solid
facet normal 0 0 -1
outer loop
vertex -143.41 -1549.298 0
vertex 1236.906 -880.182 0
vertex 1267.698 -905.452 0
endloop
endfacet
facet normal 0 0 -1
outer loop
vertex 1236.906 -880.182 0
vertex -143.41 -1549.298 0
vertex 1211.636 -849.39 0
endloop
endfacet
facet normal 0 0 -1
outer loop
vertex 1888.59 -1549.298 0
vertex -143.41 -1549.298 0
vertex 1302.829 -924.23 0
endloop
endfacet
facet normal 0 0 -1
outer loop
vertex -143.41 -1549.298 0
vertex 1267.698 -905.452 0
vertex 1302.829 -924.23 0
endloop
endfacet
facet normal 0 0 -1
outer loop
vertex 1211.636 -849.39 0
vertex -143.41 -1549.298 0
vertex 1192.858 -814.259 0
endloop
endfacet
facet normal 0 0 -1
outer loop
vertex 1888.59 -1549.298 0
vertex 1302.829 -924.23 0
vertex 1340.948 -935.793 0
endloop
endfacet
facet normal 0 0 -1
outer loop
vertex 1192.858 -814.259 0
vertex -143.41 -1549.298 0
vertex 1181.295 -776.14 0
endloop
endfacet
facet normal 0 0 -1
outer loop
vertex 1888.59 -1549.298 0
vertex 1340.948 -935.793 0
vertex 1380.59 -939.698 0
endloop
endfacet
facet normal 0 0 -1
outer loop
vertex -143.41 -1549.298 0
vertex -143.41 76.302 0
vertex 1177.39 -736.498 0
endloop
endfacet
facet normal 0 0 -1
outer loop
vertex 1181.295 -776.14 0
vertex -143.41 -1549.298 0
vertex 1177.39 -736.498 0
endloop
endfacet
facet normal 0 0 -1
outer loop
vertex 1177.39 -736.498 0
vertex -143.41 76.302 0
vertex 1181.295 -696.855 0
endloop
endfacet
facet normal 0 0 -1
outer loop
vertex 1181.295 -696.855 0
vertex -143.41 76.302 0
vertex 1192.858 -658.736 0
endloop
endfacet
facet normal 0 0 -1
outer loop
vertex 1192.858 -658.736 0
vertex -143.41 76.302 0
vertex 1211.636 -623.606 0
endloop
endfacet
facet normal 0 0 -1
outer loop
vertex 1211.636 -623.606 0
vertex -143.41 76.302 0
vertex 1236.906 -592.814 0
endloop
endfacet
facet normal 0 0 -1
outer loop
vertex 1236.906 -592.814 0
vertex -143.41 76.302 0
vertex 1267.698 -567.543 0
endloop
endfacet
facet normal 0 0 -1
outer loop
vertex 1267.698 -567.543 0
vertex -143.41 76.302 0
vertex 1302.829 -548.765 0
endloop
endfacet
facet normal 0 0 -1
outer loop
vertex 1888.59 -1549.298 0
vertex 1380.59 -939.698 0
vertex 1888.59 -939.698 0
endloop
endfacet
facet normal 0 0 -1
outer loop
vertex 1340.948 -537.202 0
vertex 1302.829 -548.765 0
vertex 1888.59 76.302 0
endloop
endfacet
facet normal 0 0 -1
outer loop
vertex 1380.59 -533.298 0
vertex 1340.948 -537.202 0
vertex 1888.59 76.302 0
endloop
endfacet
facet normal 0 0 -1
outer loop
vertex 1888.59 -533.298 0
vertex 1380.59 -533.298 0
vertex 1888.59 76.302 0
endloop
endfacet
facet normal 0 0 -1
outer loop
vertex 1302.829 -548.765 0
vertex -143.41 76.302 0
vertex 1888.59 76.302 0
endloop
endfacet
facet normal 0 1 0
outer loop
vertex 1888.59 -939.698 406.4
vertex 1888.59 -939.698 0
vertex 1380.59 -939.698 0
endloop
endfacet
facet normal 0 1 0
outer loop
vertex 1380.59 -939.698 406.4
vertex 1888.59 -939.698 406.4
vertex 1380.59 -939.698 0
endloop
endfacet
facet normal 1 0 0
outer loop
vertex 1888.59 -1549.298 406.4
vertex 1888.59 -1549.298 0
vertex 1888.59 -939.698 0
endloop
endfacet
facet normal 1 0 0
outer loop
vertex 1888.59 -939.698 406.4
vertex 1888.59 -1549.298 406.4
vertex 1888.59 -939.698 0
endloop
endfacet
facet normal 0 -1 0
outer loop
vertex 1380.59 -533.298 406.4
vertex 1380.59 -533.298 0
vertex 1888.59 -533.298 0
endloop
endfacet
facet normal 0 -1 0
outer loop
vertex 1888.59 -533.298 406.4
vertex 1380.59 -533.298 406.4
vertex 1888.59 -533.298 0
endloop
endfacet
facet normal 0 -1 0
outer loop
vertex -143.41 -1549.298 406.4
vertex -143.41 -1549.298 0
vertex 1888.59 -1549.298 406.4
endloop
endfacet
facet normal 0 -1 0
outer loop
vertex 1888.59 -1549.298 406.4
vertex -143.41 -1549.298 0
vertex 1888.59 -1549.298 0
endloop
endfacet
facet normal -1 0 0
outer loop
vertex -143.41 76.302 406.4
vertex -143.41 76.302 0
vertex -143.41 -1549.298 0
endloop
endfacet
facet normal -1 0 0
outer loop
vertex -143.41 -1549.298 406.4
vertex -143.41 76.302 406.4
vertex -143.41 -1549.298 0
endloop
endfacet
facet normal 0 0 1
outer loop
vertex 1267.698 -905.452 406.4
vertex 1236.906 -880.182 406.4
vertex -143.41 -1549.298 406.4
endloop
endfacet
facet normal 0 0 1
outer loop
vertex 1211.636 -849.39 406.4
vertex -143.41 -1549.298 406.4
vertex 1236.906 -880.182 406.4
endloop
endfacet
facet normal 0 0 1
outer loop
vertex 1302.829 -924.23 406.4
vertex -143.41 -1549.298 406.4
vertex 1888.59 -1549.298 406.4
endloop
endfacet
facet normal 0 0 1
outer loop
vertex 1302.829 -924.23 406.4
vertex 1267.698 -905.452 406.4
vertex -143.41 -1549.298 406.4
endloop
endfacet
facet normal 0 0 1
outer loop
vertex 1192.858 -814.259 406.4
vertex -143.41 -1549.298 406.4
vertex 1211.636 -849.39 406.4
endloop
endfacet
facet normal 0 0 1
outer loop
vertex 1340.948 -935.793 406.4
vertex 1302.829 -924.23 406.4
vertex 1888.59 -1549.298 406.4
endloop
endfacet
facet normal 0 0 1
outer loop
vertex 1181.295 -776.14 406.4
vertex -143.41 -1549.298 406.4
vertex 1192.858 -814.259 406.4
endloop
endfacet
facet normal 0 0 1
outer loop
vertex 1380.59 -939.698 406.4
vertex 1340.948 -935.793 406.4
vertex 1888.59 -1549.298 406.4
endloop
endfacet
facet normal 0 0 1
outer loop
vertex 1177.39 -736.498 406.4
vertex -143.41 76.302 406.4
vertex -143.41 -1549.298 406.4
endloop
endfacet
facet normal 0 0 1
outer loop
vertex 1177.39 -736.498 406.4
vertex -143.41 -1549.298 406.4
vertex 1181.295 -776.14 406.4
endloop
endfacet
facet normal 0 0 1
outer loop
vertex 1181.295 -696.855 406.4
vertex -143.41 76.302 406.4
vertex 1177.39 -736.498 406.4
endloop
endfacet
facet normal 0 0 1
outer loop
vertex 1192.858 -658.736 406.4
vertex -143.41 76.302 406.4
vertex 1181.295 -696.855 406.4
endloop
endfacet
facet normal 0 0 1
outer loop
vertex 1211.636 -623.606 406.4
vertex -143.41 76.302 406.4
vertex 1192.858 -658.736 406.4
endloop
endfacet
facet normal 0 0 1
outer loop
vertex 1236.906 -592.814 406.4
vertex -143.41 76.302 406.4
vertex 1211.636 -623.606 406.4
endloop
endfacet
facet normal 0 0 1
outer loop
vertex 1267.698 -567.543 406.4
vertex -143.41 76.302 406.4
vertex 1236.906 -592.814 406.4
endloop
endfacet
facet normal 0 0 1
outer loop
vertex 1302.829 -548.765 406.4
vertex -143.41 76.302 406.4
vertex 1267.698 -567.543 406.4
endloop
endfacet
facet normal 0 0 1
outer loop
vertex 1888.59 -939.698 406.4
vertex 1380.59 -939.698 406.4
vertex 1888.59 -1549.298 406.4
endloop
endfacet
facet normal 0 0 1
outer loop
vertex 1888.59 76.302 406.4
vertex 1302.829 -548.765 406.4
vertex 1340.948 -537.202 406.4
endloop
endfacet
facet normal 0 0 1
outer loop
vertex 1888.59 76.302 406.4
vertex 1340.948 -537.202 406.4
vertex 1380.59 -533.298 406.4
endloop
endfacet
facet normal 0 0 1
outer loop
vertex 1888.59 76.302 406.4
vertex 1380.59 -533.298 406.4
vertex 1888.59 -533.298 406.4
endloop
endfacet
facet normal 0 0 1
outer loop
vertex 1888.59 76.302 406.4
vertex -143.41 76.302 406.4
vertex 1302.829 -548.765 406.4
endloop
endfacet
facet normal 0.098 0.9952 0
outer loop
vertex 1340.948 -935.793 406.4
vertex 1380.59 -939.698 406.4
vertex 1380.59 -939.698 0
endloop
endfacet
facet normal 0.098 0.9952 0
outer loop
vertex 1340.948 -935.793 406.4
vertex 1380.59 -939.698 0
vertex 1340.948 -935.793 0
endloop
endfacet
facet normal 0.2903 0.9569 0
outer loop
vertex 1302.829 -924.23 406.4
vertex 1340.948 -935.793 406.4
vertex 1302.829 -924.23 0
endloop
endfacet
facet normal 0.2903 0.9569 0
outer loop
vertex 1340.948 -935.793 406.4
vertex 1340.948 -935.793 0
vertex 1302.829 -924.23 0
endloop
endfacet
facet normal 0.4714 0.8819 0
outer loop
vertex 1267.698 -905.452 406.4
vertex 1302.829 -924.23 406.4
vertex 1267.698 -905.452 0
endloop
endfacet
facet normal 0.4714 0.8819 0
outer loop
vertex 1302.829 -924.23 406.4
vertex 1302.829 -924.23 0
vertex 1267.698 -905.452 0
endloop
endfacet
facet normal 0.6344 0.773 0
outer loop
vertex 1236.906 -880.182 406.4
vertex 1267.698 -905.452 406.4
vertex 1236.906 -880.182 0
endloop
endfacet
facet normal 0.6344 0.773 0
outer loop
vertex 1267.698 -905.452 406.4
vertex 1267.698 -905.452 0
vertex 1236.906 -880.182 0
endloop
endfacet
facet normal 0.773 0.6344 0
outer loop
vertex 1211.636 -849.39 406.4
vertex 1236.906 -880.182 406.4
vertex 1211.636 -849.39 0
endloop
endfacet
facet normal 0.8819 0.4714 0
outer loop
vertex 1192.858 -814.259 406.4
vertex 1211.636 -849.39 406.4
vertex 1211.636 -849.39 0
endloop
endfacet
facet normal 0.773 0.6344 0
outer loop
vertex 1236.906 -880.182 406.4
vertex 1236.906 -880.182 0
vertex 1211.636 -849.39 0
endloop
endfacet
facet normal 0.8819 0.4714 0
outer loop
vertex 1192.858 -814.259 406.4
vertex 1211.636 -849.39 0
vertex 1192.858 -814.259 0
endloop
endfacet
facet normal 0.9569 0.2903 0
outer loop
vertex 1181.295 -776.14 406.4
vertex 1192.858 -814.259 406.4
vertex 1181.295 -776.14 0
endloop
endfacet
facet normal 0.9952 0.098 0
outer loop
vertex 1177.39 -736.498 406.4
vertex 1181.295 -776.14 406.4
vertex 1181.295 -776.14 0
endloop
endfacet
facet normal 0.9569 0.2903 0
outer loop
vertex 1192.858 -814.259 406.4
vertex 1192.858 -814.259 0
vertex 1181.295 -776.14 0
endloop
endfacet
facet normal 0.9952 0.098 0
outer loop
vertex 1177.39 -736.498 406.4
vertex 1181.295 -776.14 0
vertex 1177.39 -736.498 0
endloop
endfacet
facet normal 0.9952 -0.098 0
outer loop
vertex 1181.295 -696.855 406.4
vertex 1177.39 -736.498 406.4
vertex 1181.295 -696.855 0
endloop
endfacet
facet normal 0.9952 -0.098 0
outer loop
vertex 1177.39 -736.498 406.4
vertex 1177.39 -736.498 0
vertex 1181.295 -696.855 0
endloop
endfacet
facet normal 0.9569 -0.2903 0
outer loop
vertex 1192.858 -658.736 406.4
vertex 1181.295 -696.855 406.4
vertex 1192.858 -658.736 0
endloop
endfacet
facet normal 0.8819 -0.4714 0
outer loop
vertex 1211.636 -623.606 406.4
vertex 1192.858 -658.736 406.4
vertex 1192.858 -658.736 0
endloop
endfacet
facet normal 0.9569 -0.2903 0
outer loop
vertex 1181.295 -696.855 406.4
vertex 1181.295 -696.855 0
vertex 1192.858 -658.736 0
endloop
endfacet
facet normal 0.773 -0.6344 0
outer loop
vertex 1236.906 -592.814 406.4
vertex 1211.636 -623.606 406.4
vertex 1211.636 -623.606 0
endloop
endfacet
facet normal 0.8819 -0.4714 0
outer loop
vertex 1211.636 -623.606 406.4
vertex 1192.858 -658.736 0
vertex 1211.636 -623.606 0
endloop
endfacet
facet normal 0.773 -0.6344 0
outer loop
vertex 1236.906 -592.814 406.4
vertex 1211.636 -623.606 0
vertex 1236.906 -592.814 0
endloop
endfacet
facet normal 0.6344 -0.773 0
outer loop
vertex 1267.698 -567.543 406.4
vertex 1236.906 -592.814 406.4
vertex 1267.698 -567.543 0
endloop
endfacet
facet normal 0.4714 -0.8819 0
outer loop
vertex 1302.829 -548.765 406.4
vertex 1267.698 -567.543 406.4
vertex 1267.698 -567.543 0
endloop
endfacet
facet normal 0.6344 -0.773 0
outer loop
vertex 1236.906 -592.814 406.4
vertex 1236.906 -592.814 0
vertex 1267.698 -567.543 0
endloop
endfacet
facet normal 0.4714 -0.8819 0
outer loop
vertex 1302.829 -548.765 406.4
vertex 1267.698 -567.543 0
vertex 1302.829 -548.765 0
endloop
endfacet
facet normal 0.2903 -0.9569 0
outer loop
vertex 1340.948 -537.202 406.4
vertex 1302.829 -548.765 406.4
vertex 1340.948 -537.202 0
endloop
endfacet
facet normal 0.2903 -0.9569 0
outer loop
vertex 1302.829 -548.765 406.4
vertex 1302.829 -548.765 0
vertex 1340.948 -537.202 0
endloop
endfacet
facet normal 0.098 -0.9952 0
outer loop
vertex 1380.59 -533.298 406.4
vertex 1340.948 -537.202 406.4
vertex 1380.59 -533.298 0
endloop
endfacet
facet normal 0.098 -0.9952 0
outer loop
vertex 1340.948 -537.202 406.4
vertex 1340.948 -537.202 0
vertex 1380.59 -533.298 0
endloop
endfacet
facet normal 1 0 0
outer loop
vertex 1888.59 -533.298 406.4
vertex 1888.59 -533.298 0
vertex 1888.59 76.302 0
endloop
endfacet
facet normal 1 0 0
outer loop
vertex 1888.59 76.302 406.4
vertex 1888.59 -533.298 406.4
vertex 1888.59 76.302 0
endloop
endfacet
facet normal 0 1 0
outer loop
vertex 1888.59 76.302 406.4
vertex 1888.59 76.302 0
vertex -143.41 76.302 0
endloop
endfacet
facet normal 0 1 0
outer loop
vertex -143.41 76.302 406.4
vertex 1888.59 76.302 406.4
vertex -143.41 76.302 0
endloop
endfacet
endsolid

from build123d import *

# Parameters (mm, degrees)
F1_DEPTH = 406.4


with BuildPart() as f1:
    # F0 (on Top) → F1 (new body)
    with BuildSketch(Plane.XY):
        with BuildLine():
            Line((1888.590196, 76.302297), (-143.409804, 76.302297))
            Line((-143.409804, 76.302297), (-143.409804, -1549.297703))
            Line((-143.409804, -1549.297703), (1888.590196, -1549.297703))
            Line((1888.590196, -1549.297703), (1888.590196, -939.697703))
            Line((1888.590196, -939.697703), (1380.590196, -939.697703))
            ThreePointArc((1380.590196, -939.697703), (1177.390196, -736.497703), (1380.590196, -533.297703))
            Line((1380.590196, -533.297703), (1888.590196, -533.297703))
            Line((1888.590196, -533.297703), (1888.590196, 76.302297))
        make_face()
    extrude(amount=F1_DEPTH)


solid = f1.part
